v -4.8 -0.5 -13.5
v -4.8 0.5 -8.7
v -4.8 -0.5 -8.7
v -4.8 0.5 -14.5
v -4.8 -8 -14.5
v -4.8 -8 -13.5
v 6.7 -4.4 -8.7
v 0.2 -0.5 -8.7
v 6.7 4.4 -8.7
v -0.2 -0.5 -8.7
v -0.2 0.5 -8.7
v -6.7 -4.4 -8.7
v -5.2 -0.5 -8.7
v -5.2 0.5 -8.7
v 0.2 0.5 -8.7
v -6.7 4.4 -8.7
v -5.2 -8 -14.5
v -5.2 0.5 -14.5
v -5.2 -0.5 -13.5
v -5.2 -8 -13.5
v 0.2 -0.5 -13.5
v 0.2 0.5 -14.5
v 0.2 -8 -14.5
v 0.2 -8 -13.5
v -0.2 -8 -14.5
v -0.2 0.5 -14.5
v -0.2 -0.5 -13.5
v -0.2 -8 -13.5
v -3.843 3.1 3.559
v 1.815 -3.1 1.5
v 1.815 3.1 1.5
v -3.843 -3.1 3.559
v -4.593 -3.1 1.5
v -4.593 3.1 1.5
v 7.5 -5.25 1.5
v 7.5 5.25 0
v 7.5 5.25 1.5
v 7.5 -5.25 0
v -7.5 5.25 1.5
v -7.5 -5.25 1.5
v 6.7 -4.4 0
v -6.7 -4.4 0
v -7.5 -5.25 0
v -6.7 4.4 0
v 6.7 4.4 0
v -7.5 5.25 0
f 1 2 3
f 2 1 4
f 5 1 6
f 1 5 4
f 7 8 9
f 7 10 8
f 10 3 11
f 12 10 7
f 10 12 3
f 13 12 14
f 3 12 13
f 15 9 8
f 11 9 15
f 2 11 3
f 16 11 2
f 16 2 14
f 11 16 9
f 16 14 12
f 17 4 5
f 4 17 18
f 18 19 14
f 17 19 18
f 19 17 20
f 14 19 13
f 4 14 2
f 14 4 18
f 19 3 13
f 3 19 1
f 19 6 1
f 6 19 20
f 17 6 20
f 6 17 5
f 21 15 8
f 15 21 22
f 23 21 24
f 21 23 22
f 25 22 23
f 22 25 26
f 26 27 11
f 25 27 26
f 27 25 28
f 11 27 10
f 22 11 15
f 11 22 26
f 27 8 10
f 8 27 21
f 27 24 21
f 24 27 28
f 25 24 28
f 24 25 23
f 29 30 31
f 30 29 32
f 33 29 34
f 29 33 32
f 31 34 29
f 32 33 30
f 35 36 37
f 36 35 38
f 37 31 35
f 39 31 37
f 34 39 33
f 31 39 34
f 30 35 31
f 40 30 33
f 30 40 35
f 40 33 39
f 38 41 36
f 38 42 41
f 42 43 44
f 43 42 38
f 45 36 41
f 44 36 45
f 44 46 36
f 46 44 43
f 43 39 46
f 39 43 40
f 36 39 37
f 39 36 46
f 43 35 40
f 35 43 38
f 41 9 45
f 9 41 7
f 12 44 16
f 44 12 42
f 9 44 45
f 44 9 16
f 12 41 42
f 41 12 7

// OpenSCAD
module Switch() {
    
    color("darkgrey") {
        
       translate([0, 0, -0.5])
        rotate([0, 20, 0])
        translate([-10/2, -6.2/2, -0.5])
        cube([10, 6.2, 3]);

        translate([-15/2, -10.5/2, 0])
        cube([15, 10.5, 1.5]);
        
        translate([-13/2, -8.4/2, -8.7])
        cube([13, 8.4, 8.7]);
        
        for (i = [-5, 0]) {
            translate([-0.4/2+i, -1/2, -8.7-5.8])
            cube([0.4, 1, 5.8]);

            translate([-0.4/2+i, -8, -8.7-5.8])
            cube([0.4, 8, 1]);
        }
        
        

       
      
        
       
    }
    
};

module SwitchHole(clearence = 0.2) {

    translate([-13/2 - clearence, -8.4/2 - clearence, -8.7])
    cube([13 + clearence*2, 8.4 + clearence*2, 8.7+1.5]);
};

Switch();
SwitchHole();
